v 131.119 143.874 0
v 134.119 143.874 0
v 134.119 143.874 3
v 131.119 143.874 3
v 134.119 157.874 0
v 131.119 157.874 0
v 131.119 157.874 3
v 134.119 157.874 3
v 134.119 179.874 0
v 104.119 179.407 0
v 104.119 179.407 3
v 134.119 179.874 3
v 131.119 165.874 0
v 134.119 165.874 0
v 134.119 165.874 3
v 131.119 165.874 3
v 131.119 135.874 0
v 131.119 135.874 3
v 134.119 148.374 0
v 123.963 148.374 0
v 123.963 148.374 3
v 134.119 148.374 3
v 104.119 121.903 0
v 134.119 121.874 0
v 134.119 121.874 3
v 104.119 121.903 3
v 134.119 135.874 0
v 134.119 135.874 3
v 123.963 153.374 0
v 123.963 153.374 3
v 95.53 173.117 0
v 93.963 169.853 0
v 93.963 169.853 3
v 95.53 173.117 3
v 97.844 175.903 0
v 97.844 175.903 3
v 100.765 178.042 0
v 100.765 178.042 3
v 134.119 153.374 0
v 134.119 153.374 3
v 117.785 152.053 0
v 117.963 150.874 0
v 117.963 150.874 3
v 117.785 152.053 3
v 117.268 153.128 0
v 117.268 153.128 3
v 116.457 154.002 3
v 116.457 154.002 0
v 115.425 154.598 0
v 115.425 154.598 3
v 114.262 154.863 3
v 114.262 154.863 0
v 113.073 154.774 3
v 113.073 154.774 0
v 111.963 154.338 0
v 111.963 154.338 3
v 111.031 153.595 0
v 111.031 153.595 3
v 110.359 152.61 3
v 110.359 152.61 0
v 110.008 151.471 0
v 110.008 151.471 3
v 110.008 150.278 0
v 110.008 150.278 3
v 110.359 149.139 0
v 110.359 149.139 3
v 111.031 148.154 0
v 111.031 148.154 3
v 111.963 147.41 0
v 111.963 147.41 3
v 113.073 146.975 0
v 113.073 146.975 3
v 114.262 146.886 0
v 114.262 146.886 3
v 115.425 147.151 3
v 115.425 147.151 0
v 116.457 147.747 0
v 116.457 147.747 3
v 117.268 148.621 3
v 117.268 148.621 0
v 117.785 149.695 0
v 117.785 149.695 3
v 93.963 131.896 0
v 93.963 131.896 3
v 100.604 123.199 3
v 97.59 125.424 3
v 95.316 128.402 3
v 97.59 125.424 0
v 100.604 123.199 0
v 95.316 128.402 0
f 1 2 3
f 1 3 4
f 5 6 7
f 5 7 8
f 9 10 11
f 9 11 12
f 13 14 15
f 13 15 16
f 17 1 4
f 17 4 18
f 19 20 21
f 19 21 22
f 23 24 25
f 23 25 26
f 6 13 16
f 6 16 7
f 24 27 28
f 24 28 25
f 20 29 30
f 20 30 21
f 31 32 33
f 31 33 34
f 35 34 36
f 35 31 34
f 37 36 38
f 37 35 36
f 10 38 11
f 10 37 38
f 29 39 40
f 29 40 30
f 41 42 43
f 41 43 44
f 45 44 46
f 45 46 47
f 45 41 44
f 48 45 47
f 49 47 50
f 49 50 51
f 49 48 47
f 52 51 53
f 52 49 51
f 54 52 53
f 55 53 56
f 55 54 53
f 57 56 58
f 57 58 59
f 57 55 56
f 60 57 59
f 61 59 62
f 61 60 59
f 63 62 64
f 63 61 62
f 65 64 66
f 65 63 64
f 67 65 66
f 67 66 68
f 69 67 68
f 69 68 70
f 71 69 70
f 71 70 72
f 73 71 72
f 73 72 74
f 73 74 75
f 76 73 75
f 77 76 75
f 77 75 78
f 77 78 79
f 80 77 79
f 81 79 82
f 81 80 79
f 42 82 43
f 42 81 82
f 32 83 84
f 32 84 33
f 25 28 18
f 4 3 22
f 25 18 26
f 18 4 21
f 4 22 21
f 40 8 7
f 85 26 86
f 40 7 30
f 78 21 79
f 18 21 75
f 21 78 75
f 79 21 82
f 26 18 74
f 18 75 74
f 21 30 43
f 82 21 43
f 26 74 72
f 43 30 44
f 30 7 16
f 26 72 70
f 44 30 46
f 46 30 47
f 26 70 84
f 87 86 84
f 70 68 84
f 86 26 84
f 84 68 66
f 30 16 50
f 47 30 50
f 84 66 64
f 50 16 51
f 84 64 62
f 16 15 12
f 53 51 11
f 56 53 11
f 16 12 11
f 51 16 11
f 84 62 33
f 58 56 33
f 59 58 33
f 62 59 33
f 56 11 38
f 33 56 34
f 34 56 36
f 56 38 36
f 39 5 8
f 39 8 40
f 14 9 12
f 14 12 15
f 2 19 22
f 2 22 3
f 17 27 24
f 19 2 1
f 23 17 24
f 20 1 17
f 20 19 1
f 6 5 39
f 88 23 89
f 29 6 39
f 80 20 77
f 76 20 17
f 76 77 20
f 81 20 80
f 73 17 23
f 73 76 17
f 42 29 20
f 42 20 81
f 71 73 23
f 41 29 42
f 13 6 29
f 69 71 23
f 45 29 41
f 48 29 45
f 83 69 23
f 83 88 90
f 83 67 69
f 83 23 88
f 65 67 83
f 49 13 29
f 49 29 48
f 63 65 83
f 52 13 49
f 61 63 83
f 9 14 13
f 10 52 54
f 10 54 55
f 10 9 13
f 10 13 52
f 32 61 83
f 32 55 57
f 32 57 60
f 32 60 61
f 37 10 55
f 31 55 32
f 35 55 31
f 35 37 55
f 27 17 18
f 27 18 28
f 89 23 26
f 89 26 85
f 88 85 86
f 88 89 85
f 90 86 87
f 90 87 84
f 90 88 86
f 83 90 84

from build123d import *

# Parameters (mm, degrees)
SKETCH1_R           = 4
BOSS_EXTRUDE1_DEPTH = 3


with BuildPart() as part:
    # Sketch1 → Boss-Extrude1 (new body)
    with BuildSketch(Plane.XY):
        with BuildLine():
            Line((104.119192453, 179.407061364), (134.119192453, 179.874374377))
            Line((134.119192453, 179.874374377), (134.119192453, 165.874374377))
            Line((134.119192453, 165.874374377), (131.119192453, 165.874374377))
            Line((131.119192453, 165.874374377), (131.119192453, 157.874374377))
            Line((131.119192453, 157.874374377), (134.119192453, 157.874374377))
            Line((134.119192453, 157.874374377), (134.119192453, 153.374336284))
            Line((134.119192453, 153.374336284), (123.963204023, 153.374336284))
            Line((123.963204023, 153.374336284), (123.963204023, 148.374336284))
            Line((123.963204023, 148.374336284), (134.119192453, 148.374336284))
            Line((134.119192453, 148.374336284), (134.119192453, 143.874374377))
            Line((134.119192453, 143.874374377), (131.119192453, 143.874374377))
            Line((131.119192453, 143.874374377), (131.119192453, 135.874374377))
            Line((131.119192453, 135.874374377), (134.119192453, 135.874374377))
            Line((134.119192453, 135.874374377), (134.119192453, 121.874374377))
            Line((134.119192453, 121.874374377), (104.119206498, 121.903403691))
            ThreePointArc((104.119206498, 121.903403691), (97.58987401, 125.424418251), (93.963204023, 131.895661647))
            Line((93.963204023, 131.895661647), (93.963204023, 169.853170932))
            ThreePointArc((93.963204023, 169.853170932), (97.844114816, 175.902641249), (104.119192453, 179.407061364))
        make_face()
        with Locations((113.963204023, 150.874376287)):
            Circle(SKETCH1_R, mode=Mode.SUBTRACT)
    extrude(amount=BOSS_EXTRUDE1_DEPTH)


solid = part.part
